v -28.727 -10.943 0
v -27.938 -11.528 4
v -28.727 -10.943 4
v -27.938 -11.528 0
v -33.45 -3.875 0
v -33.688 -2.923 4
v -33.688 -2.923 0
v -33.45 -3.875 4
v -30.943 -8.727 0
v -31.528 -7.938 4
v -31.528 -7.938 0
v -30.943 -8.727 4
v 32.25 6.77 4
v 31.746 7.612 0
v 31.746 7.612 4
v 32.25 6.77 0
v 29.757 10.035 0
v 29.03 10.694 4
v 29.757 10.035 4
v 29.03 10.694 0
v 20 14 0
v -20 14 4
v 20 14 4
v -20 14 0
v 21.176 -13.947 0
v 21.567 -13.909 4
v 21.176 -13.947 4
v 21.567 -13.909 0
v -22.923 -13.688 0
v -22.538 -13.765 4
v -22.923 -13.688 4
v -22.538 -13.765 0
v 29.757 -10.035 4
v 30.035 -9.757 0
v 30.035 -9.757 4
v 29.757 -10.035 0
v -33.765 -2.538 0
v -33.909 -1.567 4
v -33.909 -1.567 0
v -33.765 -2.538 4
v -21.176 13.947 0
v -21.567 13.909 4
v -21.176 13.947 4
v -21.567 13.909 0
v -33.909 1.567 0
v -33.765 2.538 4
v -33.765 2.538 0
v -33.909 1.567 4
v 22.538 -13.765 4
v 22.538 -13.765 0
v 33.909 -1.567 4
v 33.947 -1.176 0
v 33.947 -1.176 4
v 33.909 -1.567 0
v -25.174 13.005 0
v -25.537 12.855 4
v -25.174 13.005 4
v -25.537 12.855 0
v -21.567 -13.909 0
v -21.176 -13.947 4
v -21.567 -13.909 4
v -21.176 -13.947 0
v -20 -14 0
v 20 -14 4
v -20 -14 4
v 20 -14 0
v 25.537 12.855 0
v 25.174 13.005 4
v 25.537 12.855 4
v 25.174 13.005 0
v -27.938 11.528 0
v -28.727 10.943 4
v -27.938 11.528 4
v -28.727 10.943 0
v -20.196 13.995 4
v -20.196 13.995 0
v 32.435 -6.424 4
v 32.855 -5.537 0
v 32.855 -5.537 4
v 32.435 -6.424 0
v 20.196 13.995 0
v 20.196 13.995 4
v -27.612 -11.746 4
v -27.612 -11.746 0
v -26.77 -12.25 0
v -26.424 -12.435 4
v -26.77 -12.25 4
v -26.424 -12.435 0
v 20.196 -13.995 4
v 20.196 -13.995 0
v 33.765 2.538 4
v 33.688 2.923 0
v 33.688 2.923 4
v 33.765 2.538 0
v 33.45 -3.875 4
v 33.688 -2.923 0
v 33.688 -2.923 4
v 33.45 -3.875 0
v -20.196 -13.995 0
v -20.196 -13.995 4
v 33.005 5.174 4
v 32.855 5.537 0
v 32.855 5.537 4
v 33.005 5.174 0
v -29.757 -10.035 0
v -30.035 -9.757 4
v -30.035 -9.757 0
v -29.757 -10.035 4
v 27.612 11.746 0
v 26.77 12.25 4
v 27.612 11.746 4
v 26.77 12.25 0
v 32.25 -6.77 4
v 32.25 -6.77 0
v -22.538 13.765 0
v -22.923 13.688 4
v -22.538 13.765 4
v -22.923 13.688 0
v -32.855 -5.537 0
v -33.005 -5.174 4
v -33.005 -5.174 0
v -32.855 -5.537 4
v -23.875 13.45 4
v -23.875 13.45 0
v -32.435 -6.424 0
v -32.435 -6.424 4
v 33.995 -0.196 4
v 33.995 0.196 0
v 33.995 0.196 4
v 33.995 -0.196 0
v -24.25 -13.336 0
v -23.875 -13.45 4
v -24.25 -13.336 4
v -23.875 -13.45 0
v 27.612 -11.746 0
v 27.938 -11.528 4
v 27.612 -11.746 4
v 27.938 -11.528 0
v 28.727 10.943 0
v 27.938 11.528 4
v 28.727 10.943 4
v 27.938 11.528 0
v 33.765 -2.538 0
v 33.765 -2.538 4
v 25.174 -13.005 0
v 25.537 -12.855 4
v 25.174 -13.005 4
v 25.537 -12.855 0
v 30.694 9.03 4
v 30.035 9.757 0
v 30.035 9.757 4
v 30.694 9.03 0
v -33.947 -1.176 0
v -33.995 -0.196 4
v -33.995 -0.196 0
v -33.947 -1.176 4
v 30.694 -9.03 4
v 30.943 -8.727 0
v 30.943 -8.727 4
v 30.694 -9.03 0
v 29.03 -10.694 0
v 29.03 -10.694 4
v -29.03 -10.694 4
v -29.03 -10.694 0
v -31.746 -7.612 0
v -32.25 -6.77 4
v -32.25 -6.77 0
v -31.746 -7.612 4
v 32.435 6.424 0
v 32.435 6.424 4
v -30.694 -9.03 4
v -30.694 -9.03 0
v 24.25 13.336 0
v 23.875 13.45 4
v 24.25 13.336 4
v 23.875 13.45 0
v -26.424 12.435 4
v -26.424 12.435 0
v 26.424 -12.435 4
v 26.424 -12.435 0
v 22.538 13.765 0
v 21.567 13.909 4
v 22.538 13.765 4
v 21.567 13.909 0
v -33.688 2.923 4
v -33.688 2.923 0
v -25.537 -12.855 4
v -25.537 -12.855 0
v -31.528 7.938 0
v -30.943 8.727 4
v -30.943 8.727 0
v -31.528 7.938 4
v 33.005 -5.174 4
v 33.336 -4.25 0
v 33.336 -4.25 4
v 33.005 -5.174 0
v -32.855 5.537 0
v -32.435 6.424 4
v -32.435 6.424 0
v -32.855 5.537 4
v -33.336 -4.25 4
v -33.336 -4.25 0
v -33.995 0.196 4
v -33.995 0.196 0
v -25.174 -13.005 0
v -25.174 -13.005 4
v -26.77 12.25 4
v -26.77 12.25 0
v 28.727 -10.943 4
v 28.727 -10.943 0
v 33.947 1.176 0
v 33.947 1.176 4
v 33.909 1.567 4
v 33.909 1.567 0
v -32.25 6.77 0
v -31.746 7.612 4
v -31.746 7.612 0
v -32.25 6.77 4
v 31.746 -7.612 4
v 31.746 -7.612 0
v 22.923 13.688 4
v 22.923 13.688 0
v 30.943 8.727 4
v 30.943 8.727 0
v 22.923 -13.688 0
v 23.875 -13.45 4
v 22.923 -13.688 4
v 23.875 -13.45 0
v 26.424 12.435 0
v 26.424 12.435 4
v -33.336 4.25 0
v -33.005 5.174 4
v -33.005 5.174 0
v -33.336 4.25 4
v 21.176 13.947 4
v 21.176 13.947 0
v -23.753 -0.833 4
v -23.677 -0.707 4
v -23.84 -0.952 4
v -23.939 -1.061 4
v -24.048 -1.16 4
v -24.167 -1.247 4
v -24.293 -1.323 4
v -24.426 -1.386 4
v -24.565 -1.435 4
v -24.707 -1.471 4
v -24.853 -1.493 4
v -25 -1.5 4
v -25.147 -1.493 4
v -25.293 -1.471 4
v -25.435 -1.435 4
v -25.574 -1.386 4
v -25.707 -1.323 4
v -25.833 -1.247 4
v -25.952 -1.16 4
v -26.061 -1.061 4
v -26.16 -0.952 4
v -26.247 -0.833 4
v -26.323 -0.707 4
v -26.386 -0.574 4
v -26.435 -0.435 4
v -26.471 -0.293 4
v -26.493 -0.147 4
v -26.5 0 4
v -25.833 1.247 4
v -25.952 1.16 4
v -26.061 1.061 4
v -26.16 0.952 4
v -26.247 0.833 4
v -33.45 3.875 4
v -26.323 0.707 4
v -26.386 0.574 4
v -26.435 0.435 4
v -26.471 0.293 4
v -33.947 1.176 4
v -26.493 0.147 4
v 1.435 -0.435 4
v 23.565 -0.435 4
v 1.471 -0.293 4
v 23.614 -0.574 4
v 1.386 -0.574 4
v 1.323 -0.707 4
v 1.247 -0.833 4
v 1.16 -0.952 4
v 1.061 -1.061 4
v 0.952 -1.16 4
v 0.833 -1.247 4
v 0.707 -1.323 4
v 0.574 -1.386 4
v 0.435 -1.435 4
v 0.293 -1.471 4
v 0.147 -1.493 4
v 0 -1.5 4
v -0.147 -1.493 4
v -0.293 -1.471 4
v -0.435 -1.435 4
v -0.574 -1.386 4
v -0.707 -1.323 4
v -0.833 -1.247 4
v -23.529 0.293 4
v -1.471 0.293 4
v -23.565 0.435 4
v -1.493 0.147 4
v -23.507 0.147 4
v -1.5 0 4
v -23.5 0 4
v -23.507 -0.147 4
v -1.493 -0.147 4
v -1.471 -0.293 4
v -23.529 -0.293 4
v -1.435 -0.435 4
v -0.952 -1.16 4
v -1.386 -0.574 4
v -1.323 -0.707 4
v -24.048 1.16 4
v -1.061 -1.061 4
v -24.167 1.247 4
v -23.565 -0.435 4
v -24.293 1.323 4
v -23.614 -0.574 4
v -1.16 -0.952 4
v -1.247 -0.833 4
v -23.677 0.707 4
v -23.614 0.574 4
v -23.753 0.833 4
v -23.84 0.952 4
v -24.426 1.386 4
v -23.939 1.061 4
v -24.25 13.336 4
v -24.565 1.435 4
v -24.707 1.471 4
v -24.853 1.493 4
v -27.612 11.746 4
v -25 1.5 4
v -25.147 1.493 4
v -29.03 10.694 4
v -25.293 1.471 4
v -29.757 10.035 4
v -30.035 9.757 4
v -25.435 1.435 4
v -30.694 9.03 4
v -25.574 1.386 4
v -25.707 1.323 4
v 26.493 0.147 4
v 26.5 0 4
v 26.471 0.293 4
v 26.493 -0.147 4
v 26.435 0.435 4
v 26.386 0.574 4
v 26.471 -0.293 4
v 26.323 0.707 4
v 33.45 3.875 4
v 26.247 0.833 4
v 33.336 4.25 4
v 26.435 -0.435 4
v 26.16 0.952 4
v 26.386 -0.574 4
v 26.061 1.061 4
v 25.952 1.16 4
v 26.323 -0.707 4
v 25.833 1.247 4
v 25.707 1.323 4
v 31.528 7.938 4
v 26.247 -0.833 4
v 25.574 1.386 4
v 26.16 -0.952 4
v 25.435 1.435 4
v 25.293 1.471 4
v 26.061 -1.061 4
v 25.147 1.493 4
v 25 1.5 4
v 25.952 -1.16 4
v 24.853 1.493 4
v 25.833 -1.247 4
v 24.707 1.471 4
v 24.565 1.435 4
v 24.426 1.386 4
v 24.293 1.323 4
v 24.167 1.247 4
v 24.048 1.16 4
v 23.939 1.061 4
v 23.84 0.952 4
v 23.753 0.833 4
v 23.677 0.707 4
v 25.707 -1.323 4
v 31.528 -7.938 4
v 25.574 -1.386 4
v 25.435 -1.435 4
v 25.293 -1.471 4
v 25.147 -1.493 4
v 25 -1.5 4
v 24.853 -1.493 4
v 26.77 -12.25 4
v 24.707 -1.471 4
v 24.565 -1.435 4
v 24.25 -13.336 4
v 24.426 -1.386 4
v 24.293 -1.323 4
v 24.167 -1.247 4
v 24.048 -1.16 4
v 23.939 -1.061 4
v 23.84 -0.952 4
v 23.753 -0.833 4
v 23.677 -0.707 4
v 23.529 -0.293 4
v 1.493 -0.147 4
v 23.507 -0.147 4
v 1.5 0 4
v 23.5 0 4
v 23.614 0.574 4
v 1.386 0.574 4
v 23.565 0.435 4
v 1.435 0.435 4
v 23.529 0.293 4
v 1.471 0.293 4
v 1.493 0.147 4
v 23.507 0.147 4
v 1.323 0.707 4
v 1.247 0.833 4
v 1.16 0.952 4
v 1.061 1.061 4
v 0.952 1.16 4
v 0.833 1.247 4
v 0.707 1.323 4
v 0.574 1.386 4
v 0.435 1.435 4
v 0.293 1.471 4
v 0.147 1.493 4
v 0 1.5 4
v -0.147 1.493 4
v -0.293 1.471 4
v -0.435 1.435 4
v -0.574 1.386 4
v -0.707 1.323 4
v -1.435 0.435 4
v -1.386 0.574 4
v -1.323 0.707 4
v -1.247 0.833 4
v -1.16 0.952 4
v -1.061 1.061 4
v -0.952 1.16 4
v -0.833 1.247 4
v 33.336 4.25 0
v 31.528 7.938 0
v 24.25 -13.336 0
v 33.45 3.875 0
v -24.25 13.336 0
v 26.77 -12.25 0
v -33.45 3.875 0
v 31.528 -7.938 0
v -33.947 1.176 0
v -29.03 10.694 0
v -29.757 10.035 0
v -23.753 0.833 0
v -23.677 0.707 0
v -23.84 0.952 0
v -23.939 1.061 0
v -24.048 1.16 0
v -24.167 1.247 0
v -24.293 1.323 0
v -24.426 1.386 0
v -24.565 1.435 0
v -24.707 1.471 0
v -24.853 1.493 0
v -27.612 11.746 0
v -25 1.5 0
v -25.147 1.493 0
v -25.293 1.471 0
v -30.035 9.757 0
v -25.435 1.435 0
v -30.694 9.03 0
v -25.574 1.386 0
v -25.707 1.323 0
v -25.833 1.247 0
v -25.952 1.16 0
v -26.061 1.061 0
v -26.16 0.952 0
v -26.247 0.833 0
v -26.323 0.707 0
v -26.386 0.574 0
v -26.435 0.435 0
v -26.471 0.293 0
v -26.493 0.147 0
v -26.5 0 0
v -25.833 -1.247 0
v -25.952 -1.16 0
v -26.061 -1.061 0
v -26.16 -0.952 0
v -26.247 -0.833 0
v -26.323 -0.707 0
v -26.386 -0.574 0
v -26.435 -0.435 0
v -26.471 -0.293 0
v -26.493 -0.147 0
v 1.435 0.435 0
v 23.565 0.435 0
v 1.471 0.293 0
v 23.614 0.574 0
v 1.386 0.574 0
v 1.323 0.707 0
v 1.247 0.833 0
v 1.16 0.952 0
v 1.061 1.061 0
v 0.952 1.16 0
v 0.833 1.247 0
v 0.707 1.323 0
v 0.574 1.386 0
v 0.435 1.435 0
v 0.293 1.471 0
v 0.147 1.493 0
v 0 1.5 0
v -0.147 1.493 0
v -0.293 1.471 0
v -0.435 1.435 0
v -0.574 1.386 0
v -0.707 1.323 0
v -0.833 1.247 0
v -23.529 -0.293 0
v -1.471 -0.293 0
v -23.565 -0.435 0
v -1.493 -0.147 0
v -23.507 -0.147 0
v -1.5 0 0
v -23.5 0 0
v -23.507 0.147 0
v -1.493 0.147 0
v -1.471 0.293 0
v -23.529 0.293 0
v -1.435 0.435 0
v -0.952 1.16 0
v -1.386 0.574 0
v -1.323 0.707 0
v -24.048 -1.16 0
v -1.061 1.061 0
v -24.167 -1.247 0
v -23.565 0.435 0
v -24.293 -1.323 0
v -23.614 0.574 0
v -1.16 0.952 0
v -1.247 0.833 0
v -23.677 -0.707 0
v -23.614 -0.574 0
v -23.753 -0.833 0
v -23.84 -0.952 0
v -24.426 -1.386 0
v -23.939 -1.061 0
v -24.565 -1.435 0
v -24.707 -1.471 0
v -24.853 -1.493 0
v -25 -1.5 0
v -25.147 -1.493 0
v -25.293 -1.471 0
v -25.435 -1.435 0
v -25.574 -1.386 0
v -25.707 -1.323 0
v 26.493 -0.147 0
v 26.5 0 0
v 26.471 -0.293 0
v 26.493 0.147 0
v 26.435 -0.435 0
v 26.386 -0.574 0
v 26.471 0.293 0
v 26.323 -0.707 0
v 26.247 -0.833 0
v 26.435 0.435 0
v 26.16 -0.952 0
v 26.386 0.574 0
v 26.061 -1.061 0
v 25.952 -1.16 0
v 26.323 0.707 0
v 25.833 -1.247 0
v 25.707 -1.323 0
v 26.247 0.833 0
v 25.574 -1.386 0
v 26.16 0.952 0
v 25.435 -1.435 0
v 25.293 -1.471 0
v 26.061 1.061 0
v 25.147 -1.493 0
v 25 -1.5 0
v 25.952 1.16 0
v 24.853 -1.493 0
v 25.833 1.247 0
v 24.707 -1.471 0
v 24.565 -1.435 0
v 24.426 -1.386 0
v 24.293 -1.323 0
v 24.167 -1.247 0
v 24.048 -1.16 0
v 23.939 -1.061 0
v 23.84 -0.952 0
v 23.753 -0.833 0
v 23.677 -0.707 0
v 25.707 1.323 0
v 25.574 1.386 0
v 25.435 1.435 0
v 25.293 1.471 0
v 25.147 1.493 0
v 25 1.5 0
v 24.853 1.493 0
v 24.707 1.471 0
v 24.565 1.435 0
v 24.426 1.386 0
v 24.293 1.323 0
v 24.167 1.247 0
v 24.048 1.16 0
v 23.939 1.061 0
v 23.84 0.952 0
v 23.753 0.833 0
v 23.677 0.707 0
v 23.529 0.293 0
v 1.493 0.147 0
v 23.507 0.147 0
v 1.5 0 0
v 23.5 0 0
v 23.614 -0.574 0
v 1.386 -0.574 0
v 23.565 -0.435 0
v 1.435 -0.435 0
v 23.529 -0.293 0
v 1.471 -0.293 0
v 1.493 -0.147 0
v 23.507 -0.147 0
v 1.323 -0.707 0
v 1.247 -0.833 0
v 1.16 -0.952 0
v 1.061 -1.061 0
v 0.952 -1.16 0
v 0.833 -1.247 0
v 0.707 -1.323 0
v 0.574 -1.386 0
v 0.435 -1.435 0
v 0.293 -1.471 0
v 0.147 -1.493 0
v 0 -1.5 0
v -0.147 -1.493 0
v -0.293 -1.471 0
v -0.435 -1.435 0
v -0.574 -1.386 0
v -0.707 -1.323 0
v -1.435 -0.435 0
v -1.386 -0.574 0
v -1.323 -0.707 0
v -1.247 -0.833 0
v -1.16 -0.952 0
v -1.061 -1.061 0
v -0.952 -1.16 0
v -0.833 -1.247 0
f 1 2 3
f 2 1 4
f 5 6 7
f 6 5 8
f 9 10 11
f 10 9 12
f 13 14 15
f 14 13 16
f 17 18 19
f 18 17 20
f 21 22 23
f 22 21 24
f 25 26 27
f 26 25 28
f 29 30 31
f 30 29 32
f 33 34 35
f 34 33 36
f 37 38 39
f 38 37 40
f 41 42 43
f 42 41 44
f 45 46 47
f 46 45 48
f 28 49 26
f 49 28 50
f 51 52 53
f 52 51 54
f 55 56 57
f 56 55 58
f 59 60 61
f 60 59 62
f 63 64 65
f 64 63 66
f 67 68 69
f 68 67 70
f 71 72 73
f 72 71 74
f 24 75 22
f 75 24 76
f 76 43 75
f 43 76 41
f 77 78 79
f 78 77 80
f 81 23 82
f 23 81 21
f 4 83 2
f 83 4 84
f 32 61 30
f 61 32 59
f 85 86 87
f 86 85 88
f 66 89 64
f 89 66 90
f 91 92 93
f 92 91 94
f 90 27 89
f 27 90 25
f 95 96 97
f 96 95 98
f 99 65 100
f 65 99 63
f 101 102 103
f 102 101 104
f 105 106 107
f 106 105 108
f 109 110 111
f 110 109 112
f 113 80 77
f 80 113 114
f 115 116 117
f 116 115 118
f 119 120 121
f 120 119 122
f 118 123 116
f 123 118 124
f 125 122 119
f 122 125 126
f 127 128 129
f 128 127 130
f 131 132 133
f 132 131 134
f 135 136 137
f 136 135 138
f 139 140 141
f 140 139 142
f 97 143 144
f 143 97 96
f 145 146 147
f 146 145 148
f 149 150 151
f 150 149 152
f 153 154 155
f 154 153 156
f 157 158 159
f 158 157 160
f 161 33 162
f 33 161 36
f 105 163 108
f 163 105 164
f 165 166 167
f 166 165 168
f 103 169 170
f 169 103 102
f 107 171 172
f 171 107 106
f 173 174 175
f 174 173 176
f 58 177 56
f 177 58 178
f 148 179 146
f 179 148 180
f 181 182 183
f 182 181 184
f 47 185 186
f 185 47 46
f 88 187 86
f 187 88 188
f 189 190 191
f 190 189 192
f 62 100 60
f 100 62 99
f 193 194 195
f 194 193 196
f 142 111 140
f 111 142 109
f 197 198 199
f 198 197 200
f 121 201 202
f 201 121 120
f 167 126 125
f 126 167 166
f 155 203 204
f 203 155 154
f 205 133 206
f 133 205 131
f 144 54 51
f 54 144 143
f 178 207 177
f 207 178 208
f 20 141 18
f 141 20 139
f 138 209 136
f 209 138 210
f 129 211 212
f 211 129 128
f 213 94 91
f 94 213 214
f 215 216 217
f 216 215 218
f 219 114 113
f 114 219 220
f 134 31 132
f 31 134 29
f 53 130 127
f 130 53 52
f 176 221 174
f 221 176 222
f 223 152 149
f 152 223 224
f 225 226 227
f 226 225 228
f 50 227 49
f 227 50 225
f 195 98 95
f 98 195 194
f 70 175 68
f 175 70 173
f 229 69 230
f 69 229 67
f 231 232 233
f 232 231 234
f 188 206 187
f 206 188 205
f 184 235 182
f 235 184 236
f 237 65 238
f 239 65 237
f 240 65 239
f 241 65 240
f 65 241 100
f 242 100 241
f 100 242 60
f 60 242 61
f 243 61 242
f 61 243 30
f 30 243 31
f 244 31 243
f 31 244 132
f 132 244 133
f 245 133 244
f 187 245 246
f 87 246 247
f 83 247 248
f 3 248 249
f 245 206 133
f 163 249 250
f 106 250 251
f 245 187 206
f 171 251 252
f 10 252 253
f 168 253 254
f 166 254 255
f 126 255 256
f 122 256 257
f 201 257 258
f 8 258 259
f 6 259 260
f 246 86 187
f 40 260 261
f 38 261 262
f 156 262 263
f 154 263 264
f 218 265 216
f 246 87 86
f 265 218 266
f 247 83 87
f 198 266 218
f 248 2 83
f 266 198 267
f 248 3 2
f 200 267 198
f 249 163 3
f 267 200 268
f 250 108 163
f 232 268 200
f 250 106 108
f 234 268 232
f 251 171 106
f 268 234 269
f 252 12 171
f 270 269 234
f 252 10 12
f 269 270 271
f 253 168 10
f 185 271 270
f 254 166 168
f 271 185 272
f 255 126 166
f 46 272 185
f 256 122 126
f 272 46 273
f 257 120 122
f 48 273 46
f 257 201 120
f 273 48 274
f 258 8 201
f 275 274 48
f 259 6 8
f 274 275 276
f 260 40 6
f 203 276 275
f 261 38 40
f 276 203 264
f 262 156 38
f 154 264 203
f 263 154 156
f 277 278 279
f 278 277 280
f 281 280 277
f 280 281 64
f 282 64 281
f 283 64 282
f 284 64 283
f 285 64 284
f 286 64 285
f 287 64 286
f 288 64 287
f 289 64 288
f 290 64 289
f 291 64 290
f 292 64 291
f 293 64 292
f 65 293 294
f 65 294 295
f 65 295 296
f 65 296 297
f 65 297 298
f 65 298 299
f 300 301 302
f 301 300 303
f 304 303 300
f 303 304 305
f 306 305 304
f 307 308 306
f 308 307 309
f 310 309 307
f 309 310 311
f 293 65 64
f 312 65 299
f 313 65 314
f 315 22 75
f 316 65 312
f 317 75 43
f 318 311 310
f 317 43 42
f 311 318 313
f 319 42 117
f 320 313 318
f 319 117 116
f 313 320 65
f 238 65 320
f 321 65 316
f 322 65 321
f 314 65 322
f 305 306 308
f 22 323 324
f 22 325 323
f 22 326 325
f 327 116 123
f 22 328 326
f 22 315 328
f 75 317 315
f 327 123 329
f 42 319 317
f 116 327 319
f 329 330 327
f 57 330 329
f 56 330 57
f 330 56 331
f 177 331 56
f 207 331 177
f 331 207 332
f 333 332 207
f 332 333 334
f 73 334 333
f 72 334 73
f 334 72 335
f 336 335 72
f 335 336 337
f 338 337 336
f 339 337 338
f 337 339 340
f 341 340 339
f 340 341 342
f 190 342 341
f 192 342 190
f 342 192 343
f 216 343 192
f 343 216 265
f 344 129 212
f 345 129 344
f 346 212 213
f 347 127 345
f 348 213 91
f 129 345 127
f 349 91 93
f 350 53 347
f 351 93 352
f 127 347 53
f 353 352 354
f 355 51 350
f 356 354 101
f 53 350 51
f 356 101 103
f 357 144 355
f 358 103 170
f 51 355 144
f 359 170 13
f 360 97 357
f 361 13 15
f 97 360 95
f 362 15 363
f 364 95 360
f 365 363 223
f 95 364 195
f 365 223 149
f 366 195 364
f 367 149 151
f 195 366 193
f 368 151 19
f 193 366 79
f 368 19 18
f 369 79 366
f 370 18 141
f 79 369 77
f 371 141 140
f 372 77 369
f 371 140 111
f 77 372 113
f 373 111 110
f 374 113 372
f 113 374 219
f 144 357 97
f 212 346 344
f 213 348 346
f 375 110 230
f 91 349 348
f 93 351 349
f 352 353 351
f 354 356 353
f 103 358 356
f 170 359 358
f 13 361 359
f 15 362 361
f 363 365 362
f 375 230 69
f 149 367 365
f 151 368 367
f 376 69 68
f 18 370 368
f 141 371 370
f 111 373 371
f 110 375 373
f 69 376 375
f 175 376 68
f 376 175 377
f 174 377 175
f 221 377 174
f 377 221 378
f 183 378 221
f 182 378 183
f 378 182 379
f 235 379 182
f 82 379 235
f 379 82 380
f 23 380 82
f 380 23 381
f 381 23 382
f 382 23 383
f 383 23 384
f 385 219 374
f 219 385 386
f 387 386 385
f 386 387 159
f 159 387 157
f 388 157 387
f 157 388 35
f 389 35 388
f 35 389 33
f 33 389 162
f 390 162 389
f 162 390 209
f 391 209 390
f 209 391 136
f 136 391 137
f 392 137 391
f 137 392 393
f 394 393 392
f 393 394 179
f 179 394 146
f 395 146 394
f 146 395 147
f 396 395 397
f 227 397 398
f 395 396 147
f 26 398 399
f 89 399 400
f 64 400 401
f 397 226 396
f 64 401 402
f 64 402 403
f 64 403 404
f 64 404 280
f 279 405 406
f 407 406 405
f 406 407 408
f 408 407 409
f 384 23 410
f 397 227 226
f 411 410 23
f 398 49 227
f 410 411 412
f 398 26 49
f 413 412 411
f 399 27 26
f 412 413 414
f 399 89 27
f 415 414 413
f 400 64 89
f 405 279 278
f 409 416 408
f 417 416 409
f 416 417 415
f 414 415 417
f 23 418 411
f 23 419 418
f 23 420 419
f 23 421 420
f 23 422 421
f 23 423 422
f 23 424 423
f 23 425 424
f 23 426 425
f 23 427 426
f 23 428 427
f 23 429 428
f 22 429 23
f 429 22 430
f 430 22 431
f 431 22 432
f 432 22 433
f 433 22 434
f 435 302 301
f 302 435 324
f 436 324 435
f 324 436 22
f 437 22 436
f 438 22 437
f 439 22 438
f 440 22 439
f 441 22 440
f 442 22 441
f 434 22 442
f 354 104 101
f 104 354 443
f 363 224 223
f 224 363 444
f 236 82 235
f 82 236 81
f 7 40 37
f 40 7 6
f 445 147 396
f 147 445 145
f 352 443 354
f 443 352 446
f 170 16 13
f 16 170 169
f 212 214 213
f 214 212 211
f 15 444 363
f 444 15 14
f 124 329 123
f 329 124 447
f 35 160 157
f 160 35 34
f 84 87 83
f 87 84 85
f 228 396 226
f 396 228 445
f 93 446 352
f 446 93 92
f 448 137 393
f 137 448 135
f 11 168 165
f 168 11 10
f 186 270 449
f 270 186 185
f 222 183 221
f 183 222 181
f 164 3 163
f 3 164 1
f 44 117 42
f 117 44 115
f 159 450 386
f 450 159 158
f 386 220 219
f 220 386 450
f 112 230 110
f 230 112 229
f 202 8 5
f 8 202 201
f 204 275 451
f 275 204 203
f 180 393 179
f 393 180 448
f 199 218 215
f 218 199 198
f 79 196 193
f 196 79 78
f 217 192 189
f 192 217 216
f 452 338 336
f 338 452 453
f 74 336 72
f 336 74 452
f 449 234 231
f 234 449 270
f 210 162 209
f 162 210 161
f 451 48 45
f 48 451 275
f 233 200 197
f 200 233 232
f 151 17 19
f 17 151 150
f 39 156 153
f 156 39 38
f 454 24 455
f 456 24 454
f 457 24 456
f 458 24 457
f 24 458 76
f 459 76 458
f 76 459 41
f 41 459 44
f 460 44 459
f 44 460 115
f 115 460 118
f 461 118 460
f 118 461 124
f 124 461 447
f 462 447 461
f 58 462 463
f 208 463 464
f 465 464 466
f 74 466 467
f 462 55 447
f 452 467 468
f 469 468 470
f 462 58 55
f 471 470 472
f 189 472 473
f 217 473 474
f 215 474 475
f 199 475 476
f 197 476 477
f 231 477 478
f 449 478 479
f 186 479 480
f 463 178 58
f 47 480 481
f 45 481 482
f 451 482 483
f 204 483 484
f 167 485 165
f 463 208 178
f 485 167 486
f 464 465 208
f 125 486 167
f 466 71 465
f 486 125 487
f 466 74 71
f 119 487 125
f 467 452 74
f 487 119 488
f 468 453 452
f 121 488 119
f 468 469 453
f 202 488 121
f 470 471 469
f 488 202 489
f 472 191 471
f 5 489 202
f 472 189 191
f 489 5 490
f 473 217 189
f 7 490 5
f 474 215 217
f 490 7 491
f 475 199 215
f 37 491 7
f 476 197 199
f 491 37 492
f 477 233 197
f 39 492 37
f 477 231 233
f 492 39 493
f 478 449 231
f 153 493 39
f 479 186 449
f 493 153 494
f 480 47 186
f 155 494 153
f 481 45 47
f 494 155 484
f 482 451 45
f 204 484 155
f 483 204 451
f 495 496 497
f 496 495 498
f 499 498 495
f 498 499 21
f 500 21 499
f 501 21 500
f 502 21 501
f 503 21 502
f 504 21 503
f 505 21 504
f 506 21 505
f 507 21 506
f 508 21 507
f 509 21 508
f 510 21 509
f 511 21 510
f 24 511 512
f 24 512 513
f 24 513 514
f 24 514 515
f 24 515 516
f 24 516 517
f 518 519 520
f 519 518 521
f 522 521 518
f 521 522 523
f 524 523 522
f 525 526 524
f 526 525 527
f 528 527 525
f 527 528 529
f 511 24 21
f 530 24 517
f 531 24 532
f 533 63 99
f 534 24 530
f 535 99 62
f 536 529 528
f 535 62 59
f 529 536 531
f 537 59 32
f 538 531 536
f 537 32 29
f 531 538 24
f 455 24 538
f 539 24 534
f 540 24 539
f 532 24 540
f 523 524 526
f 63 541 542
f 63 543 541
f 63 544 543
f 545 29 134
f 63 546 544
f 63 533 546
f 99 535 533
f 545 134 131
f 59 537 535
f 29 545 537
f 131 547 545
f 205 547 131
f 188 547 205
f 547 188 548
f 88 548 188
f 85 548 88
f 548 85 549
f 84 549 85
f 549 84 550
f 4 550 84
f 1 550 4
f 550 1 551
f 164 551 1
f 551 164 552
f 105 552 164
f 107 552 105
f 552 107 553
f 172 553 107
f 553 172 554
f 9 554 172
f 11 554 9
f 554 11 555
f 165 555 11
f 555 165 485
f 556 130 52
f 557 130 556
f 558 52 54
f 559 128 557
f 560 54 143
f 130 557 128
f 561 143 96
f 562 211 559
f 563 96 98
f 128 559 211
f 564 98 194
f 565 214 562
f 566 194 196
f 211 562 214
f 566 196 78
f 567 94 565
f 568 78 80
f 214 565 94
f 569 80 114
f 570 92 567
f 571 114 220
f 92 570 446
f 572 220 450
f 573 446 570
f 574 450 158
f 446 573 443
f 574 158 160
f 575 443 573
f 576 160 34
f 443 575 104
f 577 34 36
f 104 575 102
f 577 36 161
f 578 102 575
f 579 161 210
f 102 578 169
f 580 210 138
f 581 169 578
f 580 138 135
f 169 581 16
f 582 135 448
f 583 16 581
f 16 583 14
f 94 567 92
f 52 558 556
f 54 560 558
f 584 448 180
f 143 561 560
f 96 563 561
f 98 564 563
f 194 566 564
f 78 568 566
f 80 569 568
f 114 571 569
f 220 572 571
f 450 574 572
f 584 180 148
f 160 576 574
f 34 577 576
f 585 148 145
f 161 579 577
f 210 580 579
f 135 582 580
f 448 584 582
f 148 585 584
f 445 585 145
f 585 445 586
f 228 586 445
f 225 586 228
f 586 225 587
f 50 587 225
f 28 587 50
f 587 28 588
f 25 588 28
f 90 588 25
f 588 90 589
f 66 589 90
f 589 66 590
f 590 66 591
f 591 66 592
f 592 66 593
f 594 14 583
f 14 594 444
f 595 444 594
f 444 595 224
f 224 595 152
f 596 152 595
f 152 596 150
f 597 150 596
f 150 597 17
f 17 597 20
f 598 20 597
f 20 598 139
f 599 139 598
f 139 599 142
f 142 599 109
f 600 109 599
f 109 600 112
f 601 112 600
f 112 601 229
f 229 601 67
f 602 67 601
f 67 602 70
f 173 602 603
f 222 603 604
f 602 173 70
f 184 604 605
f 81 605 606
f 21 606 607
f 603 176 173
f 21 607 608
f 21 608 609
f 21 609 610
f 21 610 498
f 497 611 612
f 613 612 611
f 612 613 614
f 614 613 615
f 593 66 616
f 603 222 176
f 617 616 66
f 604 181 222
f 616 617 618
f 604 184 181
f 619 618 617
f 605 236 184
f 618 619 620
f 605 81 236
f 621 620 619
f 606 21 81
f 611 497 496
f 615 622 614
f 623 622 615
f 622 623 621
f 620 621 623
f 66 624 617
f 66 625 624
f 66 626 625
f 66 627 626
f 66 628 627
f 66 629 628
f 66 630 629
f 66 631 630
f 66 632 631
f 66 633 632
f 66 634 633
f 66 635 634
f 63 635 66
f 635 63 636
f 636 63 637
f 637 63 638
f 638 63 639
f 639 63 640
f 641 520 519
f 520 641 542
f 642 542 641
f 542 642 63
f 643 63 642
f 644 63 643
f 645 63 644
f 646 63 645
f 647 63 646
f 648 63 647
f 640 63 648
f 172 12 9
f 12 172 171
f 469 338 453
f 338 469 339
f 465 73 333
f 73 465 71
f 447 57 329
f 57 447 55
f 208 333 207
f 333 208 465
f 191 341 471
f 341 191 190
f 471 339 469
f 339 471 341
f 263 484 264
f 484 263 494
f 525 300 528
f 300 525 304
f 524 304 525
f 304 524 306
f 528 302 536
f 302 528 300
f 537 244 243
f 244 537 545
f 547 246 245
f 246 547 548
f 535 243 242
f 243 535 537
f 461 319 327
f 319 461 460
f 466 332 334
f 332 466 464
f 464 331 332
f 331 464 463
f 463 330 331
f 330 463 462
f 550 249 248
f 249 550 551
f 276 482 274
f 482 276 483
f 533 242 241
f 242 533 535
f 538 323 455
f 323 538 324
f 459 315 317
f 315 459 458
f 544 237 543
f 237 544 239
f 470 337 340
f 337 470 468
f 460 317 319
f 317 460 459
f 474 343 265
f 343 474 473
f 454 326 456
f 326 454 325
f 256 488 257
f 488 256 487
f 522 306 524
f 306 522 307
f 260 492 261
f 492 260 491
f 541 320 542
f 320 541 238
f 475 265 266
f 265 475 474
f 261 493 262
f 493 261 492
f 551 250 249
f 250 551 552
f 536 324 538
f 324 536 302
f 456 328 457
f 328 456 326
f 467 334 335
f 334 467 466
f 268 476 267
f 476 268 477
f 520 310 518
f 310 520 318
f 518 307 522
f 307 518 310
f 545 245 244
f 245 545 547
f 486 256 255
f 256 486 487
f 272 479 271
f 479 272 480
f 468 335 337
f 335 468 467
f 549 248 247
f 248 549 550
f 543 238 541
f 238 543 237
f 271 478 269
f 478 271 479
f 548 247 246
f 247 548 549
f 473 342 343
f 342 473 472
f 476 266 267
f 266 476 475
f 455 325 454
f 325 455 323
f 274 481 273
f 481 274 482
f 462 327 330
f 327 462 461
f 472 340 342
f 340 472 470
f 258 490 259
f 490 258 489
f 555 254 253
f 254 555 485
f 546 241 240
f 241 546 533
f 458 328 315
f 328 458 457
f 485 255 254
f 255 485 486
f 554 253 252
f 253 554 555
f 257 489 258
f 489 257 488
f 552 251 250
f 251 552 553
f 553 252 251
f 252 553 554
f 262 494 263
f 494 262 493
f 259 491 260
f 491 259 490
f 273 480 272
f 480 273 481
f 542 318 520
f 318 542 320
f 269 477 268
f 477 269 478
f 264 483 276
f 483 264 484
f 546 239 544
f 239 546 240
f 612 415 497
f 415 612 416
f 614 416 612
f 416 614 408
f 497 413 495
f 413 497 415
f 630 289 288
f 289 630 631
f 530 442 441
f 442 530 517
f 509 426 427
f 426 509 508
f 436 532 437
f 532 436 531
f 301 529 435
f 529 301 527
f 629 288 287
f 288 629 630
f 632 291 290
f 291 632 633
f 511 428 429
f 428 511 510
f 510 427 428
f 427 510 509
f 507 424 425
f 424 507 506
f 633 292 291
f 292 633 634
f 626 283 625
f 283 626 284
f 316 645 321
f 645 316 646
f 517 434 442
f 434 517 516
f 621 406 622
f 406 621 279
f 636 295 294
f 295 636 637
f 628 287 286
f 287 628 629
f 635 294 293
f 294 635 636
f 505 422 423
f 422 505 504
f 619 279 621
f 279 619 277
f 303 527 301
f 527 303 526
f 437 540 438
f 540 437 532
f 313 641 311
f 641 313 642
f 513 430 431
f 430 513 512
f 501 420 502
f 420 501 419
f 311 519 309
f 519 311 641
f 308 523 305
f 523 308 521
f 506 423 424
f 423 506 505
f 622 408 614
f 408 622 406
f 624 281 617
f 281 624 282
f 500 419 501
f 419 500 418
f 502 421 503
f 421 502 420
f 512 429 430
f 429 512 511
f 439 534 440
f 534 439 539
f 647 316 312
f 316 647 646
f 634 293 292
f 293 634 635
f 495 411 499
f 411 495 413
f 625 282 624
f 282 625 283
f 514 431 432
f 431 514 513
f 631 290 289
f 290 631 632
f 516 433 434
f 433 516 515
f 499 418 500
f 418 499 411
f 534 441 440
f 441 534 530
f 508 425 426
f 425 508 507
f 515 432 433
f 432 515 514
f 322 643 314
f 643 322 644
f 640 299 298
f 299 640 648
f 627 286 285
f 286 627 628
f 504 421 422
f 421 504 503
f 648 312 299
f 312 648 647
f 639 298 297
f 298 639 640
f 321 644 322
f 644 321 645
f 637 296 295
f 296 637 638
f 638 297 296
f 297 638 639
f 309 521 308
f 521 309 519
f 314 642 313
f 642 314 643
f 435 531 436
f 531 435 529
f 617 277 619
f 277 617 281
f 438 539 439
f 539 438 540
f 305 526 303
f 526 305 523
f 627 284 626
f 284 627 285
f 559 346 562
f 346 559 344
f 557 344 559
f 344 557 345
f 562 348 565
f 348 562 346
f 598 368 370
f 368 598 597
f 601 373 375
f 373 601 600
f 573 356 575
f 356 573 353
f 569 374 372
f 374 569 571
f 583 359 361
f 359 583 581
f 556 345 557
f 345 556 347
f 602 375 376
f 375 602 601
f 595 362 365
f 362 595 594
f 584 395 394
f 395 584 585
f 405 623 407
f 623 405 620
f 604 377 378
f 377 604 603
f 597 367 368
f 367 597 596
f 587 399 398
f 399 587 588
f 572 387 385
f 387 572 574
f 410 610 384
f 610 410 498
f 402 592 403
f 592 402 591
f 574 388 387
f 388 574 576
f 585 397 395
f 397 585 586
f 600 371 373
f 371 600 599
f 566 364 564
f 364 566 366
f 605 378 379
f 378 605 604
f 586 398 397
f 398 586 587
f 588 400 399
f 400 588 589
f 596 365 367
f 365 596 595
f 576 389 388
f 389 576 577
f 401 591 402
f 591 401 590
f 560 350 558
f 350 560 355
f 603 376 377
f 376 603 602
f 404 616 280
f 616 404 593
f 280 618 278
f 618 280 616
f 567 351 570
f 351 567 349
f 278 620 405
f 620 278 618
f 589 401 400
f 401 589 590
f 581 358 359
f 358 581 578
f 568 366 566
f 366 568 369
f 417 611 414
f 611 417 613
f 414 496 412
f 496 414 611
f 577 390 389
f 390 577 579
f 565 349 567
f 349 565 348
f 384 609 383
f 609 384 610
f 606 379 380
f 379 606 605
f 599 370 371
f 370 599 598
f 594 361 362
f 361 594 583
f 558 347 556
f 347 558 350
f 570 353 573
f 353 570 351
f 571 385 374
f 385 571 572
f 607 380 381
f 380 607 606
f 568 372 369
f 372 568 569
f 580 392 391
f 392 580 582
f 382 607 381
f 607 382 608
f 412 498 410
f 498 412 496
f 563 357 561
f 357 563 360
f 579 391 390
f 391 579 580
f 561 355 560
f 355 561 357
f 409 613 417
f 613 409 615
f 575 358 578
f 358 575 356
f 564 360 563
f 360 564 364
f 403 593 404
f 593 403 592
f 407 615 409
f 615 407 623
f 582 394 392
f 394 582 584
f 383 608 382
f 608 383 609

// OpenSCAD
// Generated with SolidPython2 for OpenSCAD task-028
$fn = 64;

difference() {
	linear_extrude(height = 4) {
		offset(r = 4) {
			hull() {
				translate(v = [-20.0, 0, 0]) {
					circle(r = 10.0);
				}
				translate(v = [20.0, 0, 0]) {
					circle(r = 10.0);
				}
			}
		}
	}
	translate(v = [-25, 0, -1]) {
		cylinder(h = 6, r = 1.5);
	}
	translate(v = [0, 0, -1]) {
		cylinder(h = 6, r = 1.5);
	}
	translate(v = [25, 0, -1]) {
		cylinder(h = 6, r = 1.5);
	}
}
